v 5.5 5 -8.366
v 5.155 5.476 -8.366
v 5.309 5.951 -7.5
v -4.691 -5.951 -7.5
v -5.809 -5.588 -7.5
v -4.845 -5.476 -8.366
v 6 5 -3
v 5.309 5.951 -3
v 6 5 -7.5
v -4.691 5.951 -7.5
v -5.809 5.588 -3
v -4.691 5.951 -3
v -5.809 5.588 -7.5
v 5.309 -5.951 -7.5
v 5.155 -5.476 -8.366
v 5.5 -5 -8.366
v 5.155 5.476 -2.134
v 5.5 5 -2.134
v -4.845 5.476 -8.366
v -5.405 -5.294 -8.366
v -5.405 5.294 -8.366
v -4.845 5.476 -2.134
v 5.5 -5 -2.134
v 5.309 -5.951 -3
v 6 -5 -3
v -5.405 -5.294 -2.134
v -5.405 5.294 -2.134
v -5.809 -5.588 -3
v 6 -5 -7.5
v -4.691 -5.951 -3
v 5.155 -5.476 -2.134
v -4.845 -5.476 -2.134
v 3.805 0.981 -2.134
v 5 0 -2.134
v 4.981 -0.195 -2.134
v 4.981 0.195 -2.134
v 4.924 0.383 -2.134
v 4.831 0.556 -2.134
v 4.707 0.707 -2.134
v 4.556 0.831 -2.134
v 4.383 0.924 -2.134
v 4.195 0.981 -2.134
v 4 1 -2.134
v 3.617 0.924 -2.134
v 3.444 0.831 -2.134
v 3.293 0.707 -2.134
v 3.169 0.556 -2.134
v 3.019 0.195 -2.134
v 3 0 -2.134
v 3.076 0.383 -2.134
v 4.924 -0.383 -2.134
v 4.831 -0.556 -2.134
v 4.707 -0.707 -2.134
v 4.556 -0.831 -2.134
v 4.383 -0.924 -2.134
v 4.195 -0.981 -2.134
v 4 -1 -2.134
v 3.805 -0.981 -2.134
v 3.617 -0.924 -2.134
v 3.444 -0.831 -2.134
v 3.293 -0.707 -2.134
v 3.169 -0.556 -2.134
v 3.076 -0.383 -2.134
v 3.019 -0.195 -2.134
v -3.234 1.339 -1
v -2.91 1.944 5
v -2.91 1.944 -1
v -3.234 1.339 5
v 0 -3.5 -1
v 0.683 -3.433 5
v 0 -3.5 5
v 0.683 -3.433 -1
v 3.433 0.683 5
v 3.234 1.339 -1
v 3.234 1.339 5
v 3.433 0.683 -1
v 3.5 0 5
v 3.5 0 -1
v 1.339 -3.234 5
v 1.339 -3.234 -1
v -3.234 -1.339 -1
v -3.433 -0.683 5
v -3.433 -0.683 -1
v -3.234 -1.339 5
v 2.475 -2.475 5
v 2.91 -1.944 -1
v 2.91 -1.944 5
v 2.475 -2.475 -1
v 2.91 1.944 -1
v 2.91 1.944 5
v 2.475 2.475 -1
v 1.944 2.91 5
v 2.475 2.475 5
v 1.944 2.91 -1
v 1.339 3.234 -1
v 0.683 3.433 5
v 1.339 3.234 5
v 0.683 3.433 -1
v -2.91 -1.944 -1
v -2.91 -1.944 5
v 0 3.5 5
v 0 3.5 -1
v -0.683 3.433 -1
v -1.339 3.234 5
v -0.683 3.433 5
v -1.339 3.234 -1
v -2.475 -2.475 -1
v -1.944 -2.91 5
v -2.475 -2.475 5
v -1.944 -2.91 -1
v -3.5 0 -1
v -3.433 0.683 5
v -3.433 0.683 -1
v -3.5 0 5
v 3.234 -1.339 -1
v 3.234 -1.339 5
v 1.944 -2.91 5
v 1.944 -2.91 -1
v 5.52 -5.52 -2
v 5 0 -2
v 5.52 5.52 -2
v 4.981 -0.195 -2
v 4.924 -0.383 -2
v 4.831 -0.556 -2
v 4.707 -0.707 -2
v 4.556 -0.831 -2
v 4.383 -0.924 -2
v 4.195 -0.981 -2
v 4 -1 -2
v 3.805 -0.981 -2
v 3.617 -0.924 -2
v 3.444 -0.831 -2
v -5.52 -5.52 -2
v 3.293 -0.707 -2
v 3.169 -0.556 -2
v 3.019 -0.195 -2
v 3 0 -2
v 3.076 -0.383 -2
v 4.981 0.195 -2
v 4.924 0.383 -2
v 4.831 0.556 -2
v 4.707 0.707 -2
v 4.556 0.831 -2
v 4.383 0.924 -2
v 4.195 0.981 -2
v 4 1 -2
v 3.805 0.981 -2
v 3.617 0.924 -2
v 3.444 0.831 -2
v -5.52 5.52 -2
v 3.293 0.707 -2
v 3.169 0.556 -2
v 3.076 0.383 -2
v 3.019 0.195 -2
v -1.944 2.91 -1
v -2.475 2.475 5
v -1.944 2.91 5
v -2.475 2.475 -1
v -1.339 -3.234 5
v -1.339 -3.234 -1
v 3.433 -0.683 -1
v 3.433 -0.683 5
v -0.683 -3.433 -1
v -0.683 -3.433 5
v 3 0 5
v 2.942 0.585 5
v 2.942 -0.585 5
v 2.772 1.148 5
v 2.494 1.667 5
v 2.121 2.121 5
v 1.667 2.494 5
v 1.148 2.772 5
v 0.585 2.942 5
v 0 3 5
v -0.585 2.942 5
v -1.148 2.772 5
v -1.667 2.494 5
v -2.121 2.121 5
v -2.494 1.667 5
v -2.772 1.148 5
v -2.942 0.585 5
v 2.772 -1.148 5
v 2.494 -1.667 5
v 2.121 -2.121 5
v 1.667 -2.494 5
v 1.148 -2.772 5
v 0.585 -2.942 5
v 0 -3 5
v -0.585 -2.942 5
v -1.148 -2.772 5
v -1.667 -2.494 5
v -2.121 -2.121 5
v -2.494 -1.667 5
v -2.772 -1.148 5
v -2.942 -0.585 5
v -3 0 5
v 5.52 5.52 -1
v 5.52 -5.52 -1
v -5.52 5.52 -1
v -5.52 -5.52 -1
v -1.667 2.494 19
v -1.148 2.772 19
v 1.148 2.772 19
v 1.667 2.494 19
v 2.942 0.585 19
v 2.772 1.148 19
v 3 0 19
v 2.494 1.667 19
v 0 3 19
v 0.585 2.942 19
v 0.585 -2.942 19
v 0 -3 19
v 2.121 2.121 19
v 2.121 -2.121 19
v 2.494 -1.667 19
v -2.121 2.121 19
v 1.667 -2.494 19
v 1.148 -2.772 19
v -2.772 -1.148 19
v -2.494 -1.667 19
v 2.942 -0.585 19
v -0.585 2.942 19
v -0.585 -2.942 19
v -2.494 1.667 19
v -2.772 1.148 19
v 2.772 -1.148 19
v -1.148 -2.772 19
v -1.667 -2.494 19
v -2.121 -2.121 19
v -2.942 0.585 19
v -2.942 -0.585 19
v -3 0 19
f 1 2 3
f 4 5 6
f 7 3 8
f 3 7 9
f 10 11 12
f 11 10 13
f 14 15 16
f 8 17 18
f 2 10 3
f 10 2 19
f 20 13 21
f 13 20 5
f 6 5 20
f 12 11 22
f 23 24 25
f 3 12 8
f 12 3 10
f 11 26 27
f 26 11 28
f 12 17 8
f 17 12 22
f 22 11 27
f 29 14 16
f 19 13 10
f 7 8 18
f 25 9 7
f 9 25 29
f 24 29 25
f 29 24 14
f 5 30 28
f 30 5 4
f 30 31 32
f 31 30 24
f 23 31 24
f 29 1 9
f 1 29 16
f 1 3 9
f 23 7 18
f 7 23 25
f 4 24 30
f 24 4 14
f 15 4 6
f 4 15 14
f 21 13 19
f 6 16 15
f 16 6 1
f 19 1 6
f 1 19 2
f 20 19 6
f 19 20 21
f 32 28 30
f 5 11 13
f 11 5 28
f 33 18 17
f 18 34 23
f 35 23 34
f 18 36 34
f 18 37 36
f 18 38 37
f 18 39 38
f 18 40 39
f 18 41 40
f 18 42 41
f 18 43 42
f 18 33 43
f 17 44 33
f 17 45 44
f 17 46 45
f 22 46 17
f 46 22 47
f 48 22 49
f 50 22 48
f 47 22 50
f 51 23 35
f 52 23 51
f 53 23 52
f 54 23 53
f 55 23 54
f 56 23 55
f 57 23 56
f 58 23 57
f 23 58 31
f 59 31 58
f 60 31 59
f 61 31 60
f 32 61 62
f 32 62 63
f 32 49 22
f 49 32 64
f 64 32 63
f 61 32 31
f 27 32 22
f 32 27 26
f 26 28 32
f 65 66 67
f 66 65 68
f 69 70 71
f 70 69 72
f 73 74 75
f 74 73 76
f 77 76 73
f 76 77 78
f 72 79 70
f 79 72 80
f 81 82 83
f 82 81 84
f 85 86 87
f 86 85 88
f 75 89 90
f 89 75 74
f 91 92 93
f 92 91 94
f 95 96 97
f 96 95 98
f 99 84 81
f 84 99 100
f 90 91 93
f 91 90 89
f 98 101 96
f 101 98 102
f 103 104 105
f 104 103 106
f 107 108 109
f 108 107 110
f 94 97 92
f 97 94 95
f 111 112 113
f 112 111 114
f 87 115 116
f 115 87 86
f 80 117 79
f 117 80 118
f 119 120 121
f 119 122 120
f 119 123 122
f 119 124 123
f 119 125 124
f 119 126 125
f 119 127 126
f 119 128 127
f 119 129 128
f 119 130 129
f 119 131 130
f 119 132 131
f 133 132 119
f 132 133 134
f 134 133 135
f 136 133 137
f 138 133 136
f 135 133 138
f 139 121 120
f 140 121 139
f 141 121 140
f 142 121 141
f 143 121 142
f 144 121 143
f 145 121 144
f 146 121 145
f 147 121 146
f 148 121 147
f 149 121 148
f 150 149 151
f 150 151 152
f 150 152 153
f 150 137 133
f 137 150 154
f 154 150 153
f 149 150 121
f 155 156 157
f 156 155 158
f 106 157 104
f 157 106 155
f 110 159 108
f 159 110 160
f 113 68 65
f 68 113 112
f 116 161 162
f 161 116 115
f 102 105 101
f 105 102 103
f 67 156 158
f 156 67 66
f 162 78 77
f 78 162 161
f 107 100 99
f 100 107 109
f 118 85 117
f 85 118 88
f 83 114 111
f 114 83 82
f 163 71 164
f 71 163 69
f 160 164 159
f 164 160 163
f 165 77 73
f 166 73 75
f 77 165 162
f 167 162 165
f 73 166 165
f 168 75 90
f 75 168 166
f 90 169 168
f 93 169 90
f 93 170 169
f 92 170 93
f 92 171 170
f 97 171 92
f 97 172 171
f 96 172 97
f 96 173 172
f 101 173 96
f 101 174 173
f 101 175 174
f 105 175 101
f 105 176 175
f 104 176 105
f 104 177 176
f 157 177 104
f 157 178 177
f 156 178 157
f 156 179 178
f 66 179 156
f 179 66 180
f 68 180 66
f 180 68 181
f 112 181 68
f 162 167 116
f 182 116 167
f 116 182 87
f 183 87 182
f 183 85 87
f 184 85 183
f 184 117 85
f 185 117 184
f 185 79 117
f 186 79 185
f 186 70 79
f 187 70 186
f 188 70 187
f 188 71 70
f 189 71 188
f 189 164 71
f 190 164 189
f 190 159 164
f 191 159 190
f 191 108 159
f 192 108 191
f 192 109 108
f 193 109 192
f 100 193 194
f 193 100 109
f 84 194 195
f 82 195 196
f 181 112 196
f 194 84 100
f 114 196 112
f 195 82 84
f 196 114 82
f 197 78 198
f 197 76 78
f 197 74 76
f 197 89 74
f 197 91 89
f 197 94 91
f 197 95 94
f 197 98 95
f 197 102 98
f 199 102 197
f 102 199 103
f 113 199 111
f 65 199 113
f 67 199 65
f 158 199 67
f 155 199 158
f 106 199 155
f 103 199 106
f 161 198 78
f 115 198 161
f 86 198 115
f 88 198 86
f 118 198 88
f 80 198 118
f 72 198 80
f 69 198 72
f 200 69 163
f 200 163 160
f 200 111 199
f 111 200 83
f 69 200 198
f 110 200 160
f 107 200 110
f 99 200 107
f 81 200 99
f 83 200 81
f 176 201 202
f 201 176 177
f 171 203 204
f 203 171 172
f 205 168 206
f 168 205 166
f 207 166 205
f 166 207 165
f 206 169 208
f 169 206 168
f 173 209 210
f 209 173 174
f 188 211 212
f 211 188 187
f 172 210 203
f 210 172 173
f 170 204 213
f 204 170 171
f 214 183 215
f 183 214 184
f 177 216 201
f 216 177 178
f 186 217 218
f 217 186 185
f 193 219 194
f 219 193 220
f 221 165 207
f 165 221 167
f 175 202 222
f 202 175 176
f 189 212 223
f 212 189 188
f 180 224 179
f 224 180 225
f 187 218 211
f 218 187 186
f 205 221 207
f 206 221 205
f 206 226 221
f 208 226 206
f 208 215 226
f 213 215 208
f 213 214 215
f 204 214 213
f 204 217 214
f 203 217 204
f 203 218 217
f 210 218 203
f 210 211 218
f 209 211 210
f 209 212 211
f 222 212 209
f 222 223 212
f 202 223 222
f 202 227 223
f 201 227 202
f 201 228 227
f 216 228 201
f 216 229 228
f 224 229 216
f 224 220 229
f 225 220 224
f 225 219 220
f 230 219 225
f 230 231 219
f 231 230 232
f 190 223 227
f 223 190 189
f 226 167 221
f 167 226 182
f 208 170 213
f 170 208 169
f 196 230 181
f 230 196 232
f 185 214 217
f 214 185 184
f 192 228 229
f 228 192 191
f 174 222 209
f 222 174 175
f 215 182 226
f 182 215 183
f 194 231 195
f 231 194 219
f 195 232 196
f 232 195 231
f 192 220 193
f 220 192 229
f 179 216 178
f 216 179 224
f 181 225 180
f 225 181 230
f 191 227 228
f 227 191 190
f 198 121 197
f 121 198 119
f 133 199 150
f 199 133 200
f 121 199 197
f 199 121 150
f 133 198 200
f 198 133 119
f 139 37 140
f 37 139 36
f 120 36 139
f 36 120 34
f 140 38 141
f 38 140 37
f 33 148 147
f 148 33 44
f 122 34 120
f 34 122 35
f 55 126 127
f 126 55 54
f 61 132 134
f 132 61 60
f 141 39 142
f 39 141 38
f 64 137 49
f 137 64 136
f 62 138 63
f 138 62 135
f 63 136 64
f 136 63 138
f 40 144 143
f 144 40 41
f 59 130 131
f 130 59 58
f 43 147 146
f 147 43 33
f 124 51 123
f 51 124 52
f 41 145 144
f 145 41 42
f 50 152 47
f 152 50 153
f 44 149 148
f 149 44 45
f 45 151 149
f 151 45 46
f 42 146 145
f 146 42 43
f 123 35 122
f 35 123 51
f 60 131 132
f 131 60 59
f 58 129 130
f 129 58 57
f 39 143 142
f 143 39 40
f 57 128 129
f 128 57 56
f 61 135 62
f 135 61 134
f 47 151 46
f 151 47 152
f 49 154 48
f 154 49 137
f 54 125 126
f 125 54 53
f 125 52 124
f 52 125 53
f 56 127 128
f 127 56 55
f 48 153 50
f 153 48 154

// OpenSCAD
// Parameters
body_width = 12; //[6:24:0.5]
body_depth = 12; //[6:24:0.5]
body_height = 6.5; //[3.25:13:0.25]
body_rounding_radius = 1; //[0.5:2:0.1]
panel_thickness = 3; //[1.5:6:0.5]
shaft_length = 15; //[7.5:30:0.5]
overlap = 1; //[0.5:2:0.1]
boss_diameter = 7; //[3.5:14:0.25]
boss_height = 2; //[1:4:0.25]
thread_diameter = 7; //[3.5:14:0.25]
thread_height = 6; //[3:12:0.5]
shaft_diameter = 6; //[3:12:0.25]
wafer_thickness = 1; //[0.5:2:0.1]
wafer_scale = 0.92; //[0.8:1:0.01]
spigot_diameter = 2; //[1:4:0.1]
spigot_height = 1.5; //[0.75:3:0.1]
spigot_offset_x = 4; //[2:8:0.25]

// Potentiometer - complete geometry
module potentiometer() {
  color("DimGray") {
    // Potentiometer Body
    translate([0, 0, -(boss_height + body_height / 2)])
      minkowski() {
        cube([body_width - 2 * body_rounding_radius, body_depth - 2 * body_rounding_radius, body_height - 2 * body_rounding_radius], center=true);
        sphere(r=body_rounding_radius, center=true);
      }
    
    // Mounting Boss/Bushing
    translate([0, 0, -boss_height / 2])
      cylinder(r=boss_diameter / 2, h=boss_height, center=true, $fn=32);
    
    // Threaded Bushing
    translate([0, 0, thread_height / 2 - overlap])
      cylinder(r=thread_diameter / 2, h=thread_height, center=true, $fn=32);
    
    // Shaft
    translate([0, 0, thread_height + shaft_length / 2 - 2 * overlap])
      cylinder(r=shaft_diameter / 2, h=shaft_length, center=true, $fn=32);
    
    // Face Plate/Wafer
    translate([0, 0, -boss_height - wafer_thickness / 2 + overlap])
      cube([body_width * wafer_scale, body_depth * wafer_scale, wafer_thickness], center=true);
    
    // Anti-Rotation Spigot
    translate([spigot_offset_x, 0, -boss_height + spigot_height / 2 - overlap])
      cylinder(r=spigot_diameter / 2, h=spigot_height, center=true, $fn=32);
  }
}

// Assembly
module assembly() {
  potentiometer();
}

assembly();
